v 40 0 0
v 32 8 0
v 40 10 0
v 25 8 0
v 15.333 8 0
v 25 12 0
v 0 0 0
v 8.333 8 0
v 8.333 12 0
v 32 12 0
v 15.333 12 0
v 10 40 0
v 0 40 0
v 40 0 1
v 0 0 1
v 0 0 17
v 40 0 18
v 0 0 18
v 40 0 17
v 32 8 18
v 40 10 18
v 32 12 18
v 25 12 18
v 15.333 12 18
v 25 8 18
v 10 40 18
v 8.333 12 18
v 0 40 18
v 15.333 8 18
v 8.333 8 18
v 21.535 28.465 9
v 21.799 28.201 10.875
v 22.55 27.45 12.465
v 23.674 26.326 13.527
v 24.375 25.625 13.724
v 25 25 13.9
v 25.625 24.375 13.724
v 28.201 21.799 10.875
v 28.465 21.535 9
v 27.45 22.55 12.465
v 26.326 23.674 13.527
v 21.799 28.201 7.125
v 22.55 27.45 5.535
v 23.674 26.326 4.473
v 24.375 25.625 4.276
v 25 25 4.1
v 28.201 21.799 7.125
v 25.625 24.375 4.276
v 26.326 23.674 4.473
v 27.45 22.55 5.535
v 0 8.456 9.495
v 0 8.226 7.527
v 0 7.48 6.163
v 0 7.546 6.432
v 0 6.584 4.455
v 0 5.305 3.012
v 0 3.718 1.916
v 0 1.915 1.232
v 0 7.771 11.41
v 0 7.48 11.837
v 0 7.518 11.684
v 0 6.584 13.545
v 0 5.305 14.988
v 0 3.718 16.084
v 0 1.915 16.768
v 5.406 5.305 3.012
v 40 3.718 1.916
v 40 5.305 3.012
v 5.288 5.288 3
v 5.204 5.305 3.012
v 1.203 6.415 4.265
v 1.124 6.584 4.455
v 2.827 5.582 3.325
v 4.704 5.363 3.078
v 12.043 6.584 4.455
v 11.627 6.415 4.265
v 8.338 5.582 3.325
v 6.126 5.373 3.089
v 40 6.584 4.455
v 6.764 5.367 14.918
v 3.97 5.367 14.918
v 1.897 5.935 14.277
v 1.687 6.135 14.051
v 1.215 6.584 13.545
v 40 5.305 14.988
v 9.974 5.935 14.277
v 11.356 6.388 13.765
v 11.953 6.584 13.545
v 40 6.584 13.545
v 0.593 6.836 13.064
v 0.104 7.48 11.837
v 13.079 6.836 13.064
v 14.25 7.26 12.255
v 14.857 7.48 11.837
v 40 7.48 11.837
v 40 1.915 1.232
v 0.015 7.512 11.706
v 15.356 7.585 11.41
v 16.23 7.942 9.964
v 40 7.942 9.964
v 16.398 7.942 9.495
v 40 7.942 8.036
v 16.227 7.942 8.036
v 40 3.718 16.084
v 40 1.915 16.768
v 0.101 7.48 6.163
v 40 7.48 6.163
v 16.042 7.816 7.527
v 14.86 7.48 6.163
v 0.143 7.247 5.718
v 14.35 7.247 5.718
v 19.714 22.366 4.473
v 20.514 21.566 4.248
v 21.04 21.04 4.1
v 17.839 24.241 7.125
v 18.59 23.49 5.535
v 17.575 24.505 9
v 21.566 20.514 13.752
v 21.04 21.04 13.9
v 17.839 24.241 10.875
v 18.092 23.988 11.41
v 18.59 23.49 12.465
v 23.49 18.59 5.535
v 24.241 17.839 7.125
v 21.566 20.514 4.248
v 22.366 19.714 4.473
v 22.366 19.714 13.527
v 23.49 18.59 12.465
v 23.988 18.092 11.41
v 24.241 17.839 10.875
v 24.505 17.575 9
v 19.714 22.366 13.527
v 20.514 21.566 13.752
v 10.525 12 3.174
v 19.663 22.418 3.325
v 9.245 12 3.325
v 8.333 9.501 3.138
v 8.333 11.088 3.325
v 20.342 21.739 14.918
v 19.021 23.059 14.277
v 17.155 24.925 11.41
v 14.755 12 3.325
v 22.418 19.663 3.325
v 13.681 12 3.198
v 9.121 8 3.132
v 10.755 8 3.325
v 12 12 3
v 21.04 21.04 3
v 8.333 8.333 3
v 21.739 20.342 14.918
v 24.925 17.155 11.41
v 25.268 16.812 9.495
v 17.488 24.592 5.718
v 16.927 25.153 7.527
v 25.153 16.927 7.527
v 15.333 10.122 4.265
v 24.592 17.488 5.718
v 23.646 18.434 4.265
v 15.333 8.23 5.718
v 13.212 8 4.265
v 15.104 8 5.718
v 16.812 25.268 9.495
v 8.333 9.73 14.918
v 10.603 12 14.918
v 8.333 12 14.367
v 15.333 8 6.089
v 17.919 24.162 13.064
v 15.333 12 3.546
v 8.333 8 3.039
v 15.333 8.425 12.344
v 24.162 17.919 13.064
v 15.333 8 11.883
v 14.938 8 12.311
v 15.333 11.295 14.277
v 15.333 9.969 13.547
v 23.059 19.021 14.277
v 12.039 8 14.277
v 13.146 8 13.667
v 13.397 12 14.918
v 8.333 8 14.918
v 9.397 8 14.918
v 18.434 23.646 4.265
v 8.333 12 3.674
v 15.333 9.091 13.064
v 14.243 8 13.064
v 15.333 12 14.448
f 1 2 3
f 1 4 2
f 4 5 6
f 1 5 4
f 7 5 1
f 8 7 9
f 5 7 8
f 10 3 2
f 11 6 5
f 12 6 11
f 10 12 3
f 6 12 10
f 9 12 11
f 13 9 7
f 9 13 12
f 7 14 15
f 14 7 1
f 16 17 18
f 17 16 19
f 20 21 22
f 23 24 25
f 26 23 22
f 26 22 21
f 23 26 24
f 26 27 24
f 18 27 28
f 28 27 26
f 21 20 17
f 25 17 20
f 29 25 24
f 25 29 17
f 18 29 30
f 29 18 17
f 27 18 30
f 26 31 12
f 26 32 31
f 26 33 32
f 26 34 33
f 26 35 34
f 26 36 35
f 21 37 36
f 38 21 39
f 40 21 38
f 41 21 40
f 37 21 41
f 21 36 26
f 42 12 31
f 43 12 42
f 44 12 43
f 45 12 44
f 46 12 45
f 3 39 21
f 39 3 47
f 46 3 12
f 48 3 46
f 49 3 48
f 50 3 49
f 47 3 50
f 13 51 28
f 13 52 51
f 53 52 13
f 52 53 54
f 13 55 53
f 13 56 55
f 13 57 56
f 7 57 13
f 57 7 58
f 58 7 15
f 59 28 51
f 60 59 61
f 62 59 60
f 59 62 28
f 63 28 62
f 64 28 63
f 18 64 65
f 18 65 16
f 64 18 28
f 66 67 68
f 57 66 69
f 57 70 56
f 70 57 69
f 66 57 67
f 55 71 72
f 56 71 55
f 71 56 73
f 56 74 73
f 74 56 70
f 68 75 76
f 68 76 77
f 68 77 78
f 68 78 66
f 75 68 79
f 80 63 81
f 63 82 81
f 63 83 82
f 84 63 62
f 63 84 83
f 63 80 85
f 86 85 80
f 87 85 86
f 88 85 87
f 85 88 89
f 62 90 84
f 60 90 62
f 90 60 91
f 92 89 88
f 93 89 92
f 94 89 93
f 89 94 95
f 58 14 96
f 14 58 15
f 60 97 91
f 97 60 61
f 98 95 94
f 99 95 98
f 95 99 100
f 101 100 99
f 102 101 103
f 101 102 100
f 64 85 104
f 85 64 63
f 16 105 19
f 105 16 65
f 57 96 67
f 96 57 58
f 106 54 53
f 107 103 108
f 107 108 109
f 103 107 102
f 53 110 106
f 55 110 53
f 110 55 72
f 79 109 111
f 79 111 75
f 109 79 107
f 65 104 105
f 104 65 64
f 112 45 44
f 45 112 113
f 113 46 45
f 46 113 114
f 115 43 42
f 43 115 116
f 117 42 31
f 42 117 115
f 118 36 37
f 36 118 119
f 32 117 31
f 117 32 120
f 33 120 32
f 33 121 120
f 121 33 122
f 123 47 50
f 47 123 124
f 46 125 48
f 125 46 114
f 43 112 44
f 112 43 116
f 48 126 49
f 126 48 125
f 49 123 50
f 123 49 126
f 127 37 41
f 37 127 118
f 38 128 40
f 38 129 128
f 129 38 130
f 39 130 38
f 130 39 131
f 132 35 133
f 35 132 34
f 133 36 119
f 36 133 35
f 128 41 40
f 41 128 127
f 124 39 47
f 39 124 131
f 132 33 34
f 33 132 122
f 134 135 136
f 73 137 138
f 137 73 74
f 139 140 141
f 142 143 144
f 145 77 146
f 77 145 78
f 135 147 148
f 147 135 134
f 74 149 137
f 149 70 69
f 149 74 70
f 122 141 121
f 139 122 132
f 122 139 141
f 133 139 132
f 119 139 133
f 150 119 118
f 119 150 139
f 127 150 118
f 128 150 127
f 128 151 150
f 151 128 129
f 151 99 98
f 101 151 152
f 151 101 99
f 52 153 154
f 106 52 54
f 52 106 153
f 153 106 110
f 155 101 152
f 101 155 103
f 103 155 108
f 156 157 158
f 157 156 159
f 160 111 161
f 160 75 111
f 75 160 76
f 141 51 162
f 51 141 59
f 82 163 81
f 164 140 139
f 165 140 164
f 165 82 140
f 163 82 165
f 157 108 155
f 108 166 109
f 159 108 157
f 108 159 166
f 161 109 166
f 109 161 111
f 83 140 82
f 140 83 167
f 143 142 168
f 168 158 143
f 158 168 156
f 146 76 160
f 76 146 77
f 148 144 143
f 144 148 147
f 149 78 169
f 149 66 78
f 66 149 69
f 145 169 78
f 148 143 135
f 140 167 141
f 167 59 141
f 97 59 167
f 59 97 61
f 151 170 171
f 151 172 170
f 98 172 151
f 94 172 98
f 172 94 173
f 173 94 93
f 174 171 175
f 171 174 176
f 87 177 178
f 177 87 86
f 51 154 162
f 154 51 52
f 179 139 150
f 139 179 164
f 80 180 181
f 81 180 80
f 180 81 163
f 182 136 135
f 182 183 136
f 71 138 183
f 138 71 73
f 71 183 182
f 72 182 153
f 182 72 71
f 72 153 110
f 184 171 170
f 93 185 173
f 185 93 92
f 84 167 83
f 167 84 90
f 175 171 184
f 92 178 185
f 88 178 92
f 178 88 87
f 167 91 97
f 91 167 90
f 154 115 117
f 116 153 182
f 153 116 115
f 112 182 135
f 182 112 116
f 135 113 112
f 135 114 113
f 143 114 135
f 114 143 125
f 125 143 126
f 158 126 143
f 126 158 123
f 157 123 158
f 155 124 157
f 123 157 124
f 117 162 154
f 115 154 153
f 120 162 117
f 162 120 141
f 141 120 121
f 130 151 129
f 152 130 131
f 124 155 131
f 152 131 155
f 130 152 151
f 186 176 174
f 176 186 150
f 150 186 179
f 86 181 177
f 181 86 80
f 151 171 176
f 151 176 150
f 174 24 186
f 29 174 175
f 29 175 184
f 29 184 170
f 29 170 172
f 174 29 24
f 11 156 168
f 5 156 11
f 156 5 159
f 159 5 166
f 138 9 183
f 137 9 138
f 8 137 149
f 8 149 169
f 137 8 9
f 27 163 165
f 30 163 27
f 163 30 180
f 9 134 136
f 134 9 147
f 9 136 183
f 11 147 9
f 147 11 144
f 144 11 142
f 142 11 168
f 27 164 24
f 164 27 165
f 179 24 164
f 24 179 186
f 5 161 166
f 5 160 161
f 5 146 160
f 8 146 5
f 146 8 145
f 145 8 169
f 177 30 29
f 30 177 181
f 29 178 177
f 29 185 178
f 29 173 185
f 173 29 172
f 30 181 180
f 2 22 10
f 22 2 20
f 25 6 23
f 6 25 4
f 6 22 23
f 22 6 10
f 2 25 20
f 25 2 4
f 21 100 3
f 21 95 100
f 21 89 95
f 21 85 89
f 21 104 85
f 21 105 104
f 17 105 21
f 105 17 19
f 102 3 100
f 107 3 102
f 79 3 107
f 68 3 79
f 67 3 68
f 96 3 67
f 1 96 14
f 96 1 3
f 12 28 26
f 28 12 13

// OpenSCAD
poleSize=16;
blockHeavyness=2;
blockHeight=50;
blockDepth=50;
screwAccessHole=12;
screwSize=6;
coupleDepth=5.6;
coupleDiameter=9.8;
binderWidth=7;
binderHeight=4;

//Math
//witdh of the block
blockWidth=poleSize+blockHeavyness;
//length of line betewen right angle and middle of triangleside C
triHeightC=blockHeight*blockDepth/sqrt(blockHeight*blockHeight+blockDepth*blockDepth);



difference(){
    //MainBlock
    rotate([0,0,0]){
        linear_extrude(height = blockWidth){
            polygon(points=[[0,0],[0,blockDepth],[blockHeight,0]]);
        }
    }
        //pole
    translate([-2,0,blockWidth/2]){
        rotate([0,90,0]){
            cylinder(d=poleSize,h=blockHeight+4);
        }
    }
    //screwHole
    translate([0,0,blockWidth/2]){
        rotate([0,90,45]){
            cylinder(d=coupleDiameter,h=75);
        }
    }
    //srewAccessHole
    translate([0,0,blockWidth/2]){
        rotate([0,90,45]){
            cylinder(d=screwAccessHole,h=triHeightC-coupleDepth);
        }
    }
    //strpiBlock1
    translate([blockHeight/6,poleSize/2,-1]){
        cube([binderWidth,binderHeight,blockWidth+2]);
    }
    //strpiBlock2
    translate([blockHeight/6*3,poleSize/2,-1]){
        cube([binderWidth,binderHeight,blockWidth+2]);
    }
    //endFlatBlockTop
    translate([blockHeight-10,-1,-0.5]){
        cube([11,11,blockWidth+2]);
    }
    //endFlatBlockBottom
    translate([-0.5,blockDepth-10,-1]){
        cube([11,11,blockWidth+2]);
    }
}
